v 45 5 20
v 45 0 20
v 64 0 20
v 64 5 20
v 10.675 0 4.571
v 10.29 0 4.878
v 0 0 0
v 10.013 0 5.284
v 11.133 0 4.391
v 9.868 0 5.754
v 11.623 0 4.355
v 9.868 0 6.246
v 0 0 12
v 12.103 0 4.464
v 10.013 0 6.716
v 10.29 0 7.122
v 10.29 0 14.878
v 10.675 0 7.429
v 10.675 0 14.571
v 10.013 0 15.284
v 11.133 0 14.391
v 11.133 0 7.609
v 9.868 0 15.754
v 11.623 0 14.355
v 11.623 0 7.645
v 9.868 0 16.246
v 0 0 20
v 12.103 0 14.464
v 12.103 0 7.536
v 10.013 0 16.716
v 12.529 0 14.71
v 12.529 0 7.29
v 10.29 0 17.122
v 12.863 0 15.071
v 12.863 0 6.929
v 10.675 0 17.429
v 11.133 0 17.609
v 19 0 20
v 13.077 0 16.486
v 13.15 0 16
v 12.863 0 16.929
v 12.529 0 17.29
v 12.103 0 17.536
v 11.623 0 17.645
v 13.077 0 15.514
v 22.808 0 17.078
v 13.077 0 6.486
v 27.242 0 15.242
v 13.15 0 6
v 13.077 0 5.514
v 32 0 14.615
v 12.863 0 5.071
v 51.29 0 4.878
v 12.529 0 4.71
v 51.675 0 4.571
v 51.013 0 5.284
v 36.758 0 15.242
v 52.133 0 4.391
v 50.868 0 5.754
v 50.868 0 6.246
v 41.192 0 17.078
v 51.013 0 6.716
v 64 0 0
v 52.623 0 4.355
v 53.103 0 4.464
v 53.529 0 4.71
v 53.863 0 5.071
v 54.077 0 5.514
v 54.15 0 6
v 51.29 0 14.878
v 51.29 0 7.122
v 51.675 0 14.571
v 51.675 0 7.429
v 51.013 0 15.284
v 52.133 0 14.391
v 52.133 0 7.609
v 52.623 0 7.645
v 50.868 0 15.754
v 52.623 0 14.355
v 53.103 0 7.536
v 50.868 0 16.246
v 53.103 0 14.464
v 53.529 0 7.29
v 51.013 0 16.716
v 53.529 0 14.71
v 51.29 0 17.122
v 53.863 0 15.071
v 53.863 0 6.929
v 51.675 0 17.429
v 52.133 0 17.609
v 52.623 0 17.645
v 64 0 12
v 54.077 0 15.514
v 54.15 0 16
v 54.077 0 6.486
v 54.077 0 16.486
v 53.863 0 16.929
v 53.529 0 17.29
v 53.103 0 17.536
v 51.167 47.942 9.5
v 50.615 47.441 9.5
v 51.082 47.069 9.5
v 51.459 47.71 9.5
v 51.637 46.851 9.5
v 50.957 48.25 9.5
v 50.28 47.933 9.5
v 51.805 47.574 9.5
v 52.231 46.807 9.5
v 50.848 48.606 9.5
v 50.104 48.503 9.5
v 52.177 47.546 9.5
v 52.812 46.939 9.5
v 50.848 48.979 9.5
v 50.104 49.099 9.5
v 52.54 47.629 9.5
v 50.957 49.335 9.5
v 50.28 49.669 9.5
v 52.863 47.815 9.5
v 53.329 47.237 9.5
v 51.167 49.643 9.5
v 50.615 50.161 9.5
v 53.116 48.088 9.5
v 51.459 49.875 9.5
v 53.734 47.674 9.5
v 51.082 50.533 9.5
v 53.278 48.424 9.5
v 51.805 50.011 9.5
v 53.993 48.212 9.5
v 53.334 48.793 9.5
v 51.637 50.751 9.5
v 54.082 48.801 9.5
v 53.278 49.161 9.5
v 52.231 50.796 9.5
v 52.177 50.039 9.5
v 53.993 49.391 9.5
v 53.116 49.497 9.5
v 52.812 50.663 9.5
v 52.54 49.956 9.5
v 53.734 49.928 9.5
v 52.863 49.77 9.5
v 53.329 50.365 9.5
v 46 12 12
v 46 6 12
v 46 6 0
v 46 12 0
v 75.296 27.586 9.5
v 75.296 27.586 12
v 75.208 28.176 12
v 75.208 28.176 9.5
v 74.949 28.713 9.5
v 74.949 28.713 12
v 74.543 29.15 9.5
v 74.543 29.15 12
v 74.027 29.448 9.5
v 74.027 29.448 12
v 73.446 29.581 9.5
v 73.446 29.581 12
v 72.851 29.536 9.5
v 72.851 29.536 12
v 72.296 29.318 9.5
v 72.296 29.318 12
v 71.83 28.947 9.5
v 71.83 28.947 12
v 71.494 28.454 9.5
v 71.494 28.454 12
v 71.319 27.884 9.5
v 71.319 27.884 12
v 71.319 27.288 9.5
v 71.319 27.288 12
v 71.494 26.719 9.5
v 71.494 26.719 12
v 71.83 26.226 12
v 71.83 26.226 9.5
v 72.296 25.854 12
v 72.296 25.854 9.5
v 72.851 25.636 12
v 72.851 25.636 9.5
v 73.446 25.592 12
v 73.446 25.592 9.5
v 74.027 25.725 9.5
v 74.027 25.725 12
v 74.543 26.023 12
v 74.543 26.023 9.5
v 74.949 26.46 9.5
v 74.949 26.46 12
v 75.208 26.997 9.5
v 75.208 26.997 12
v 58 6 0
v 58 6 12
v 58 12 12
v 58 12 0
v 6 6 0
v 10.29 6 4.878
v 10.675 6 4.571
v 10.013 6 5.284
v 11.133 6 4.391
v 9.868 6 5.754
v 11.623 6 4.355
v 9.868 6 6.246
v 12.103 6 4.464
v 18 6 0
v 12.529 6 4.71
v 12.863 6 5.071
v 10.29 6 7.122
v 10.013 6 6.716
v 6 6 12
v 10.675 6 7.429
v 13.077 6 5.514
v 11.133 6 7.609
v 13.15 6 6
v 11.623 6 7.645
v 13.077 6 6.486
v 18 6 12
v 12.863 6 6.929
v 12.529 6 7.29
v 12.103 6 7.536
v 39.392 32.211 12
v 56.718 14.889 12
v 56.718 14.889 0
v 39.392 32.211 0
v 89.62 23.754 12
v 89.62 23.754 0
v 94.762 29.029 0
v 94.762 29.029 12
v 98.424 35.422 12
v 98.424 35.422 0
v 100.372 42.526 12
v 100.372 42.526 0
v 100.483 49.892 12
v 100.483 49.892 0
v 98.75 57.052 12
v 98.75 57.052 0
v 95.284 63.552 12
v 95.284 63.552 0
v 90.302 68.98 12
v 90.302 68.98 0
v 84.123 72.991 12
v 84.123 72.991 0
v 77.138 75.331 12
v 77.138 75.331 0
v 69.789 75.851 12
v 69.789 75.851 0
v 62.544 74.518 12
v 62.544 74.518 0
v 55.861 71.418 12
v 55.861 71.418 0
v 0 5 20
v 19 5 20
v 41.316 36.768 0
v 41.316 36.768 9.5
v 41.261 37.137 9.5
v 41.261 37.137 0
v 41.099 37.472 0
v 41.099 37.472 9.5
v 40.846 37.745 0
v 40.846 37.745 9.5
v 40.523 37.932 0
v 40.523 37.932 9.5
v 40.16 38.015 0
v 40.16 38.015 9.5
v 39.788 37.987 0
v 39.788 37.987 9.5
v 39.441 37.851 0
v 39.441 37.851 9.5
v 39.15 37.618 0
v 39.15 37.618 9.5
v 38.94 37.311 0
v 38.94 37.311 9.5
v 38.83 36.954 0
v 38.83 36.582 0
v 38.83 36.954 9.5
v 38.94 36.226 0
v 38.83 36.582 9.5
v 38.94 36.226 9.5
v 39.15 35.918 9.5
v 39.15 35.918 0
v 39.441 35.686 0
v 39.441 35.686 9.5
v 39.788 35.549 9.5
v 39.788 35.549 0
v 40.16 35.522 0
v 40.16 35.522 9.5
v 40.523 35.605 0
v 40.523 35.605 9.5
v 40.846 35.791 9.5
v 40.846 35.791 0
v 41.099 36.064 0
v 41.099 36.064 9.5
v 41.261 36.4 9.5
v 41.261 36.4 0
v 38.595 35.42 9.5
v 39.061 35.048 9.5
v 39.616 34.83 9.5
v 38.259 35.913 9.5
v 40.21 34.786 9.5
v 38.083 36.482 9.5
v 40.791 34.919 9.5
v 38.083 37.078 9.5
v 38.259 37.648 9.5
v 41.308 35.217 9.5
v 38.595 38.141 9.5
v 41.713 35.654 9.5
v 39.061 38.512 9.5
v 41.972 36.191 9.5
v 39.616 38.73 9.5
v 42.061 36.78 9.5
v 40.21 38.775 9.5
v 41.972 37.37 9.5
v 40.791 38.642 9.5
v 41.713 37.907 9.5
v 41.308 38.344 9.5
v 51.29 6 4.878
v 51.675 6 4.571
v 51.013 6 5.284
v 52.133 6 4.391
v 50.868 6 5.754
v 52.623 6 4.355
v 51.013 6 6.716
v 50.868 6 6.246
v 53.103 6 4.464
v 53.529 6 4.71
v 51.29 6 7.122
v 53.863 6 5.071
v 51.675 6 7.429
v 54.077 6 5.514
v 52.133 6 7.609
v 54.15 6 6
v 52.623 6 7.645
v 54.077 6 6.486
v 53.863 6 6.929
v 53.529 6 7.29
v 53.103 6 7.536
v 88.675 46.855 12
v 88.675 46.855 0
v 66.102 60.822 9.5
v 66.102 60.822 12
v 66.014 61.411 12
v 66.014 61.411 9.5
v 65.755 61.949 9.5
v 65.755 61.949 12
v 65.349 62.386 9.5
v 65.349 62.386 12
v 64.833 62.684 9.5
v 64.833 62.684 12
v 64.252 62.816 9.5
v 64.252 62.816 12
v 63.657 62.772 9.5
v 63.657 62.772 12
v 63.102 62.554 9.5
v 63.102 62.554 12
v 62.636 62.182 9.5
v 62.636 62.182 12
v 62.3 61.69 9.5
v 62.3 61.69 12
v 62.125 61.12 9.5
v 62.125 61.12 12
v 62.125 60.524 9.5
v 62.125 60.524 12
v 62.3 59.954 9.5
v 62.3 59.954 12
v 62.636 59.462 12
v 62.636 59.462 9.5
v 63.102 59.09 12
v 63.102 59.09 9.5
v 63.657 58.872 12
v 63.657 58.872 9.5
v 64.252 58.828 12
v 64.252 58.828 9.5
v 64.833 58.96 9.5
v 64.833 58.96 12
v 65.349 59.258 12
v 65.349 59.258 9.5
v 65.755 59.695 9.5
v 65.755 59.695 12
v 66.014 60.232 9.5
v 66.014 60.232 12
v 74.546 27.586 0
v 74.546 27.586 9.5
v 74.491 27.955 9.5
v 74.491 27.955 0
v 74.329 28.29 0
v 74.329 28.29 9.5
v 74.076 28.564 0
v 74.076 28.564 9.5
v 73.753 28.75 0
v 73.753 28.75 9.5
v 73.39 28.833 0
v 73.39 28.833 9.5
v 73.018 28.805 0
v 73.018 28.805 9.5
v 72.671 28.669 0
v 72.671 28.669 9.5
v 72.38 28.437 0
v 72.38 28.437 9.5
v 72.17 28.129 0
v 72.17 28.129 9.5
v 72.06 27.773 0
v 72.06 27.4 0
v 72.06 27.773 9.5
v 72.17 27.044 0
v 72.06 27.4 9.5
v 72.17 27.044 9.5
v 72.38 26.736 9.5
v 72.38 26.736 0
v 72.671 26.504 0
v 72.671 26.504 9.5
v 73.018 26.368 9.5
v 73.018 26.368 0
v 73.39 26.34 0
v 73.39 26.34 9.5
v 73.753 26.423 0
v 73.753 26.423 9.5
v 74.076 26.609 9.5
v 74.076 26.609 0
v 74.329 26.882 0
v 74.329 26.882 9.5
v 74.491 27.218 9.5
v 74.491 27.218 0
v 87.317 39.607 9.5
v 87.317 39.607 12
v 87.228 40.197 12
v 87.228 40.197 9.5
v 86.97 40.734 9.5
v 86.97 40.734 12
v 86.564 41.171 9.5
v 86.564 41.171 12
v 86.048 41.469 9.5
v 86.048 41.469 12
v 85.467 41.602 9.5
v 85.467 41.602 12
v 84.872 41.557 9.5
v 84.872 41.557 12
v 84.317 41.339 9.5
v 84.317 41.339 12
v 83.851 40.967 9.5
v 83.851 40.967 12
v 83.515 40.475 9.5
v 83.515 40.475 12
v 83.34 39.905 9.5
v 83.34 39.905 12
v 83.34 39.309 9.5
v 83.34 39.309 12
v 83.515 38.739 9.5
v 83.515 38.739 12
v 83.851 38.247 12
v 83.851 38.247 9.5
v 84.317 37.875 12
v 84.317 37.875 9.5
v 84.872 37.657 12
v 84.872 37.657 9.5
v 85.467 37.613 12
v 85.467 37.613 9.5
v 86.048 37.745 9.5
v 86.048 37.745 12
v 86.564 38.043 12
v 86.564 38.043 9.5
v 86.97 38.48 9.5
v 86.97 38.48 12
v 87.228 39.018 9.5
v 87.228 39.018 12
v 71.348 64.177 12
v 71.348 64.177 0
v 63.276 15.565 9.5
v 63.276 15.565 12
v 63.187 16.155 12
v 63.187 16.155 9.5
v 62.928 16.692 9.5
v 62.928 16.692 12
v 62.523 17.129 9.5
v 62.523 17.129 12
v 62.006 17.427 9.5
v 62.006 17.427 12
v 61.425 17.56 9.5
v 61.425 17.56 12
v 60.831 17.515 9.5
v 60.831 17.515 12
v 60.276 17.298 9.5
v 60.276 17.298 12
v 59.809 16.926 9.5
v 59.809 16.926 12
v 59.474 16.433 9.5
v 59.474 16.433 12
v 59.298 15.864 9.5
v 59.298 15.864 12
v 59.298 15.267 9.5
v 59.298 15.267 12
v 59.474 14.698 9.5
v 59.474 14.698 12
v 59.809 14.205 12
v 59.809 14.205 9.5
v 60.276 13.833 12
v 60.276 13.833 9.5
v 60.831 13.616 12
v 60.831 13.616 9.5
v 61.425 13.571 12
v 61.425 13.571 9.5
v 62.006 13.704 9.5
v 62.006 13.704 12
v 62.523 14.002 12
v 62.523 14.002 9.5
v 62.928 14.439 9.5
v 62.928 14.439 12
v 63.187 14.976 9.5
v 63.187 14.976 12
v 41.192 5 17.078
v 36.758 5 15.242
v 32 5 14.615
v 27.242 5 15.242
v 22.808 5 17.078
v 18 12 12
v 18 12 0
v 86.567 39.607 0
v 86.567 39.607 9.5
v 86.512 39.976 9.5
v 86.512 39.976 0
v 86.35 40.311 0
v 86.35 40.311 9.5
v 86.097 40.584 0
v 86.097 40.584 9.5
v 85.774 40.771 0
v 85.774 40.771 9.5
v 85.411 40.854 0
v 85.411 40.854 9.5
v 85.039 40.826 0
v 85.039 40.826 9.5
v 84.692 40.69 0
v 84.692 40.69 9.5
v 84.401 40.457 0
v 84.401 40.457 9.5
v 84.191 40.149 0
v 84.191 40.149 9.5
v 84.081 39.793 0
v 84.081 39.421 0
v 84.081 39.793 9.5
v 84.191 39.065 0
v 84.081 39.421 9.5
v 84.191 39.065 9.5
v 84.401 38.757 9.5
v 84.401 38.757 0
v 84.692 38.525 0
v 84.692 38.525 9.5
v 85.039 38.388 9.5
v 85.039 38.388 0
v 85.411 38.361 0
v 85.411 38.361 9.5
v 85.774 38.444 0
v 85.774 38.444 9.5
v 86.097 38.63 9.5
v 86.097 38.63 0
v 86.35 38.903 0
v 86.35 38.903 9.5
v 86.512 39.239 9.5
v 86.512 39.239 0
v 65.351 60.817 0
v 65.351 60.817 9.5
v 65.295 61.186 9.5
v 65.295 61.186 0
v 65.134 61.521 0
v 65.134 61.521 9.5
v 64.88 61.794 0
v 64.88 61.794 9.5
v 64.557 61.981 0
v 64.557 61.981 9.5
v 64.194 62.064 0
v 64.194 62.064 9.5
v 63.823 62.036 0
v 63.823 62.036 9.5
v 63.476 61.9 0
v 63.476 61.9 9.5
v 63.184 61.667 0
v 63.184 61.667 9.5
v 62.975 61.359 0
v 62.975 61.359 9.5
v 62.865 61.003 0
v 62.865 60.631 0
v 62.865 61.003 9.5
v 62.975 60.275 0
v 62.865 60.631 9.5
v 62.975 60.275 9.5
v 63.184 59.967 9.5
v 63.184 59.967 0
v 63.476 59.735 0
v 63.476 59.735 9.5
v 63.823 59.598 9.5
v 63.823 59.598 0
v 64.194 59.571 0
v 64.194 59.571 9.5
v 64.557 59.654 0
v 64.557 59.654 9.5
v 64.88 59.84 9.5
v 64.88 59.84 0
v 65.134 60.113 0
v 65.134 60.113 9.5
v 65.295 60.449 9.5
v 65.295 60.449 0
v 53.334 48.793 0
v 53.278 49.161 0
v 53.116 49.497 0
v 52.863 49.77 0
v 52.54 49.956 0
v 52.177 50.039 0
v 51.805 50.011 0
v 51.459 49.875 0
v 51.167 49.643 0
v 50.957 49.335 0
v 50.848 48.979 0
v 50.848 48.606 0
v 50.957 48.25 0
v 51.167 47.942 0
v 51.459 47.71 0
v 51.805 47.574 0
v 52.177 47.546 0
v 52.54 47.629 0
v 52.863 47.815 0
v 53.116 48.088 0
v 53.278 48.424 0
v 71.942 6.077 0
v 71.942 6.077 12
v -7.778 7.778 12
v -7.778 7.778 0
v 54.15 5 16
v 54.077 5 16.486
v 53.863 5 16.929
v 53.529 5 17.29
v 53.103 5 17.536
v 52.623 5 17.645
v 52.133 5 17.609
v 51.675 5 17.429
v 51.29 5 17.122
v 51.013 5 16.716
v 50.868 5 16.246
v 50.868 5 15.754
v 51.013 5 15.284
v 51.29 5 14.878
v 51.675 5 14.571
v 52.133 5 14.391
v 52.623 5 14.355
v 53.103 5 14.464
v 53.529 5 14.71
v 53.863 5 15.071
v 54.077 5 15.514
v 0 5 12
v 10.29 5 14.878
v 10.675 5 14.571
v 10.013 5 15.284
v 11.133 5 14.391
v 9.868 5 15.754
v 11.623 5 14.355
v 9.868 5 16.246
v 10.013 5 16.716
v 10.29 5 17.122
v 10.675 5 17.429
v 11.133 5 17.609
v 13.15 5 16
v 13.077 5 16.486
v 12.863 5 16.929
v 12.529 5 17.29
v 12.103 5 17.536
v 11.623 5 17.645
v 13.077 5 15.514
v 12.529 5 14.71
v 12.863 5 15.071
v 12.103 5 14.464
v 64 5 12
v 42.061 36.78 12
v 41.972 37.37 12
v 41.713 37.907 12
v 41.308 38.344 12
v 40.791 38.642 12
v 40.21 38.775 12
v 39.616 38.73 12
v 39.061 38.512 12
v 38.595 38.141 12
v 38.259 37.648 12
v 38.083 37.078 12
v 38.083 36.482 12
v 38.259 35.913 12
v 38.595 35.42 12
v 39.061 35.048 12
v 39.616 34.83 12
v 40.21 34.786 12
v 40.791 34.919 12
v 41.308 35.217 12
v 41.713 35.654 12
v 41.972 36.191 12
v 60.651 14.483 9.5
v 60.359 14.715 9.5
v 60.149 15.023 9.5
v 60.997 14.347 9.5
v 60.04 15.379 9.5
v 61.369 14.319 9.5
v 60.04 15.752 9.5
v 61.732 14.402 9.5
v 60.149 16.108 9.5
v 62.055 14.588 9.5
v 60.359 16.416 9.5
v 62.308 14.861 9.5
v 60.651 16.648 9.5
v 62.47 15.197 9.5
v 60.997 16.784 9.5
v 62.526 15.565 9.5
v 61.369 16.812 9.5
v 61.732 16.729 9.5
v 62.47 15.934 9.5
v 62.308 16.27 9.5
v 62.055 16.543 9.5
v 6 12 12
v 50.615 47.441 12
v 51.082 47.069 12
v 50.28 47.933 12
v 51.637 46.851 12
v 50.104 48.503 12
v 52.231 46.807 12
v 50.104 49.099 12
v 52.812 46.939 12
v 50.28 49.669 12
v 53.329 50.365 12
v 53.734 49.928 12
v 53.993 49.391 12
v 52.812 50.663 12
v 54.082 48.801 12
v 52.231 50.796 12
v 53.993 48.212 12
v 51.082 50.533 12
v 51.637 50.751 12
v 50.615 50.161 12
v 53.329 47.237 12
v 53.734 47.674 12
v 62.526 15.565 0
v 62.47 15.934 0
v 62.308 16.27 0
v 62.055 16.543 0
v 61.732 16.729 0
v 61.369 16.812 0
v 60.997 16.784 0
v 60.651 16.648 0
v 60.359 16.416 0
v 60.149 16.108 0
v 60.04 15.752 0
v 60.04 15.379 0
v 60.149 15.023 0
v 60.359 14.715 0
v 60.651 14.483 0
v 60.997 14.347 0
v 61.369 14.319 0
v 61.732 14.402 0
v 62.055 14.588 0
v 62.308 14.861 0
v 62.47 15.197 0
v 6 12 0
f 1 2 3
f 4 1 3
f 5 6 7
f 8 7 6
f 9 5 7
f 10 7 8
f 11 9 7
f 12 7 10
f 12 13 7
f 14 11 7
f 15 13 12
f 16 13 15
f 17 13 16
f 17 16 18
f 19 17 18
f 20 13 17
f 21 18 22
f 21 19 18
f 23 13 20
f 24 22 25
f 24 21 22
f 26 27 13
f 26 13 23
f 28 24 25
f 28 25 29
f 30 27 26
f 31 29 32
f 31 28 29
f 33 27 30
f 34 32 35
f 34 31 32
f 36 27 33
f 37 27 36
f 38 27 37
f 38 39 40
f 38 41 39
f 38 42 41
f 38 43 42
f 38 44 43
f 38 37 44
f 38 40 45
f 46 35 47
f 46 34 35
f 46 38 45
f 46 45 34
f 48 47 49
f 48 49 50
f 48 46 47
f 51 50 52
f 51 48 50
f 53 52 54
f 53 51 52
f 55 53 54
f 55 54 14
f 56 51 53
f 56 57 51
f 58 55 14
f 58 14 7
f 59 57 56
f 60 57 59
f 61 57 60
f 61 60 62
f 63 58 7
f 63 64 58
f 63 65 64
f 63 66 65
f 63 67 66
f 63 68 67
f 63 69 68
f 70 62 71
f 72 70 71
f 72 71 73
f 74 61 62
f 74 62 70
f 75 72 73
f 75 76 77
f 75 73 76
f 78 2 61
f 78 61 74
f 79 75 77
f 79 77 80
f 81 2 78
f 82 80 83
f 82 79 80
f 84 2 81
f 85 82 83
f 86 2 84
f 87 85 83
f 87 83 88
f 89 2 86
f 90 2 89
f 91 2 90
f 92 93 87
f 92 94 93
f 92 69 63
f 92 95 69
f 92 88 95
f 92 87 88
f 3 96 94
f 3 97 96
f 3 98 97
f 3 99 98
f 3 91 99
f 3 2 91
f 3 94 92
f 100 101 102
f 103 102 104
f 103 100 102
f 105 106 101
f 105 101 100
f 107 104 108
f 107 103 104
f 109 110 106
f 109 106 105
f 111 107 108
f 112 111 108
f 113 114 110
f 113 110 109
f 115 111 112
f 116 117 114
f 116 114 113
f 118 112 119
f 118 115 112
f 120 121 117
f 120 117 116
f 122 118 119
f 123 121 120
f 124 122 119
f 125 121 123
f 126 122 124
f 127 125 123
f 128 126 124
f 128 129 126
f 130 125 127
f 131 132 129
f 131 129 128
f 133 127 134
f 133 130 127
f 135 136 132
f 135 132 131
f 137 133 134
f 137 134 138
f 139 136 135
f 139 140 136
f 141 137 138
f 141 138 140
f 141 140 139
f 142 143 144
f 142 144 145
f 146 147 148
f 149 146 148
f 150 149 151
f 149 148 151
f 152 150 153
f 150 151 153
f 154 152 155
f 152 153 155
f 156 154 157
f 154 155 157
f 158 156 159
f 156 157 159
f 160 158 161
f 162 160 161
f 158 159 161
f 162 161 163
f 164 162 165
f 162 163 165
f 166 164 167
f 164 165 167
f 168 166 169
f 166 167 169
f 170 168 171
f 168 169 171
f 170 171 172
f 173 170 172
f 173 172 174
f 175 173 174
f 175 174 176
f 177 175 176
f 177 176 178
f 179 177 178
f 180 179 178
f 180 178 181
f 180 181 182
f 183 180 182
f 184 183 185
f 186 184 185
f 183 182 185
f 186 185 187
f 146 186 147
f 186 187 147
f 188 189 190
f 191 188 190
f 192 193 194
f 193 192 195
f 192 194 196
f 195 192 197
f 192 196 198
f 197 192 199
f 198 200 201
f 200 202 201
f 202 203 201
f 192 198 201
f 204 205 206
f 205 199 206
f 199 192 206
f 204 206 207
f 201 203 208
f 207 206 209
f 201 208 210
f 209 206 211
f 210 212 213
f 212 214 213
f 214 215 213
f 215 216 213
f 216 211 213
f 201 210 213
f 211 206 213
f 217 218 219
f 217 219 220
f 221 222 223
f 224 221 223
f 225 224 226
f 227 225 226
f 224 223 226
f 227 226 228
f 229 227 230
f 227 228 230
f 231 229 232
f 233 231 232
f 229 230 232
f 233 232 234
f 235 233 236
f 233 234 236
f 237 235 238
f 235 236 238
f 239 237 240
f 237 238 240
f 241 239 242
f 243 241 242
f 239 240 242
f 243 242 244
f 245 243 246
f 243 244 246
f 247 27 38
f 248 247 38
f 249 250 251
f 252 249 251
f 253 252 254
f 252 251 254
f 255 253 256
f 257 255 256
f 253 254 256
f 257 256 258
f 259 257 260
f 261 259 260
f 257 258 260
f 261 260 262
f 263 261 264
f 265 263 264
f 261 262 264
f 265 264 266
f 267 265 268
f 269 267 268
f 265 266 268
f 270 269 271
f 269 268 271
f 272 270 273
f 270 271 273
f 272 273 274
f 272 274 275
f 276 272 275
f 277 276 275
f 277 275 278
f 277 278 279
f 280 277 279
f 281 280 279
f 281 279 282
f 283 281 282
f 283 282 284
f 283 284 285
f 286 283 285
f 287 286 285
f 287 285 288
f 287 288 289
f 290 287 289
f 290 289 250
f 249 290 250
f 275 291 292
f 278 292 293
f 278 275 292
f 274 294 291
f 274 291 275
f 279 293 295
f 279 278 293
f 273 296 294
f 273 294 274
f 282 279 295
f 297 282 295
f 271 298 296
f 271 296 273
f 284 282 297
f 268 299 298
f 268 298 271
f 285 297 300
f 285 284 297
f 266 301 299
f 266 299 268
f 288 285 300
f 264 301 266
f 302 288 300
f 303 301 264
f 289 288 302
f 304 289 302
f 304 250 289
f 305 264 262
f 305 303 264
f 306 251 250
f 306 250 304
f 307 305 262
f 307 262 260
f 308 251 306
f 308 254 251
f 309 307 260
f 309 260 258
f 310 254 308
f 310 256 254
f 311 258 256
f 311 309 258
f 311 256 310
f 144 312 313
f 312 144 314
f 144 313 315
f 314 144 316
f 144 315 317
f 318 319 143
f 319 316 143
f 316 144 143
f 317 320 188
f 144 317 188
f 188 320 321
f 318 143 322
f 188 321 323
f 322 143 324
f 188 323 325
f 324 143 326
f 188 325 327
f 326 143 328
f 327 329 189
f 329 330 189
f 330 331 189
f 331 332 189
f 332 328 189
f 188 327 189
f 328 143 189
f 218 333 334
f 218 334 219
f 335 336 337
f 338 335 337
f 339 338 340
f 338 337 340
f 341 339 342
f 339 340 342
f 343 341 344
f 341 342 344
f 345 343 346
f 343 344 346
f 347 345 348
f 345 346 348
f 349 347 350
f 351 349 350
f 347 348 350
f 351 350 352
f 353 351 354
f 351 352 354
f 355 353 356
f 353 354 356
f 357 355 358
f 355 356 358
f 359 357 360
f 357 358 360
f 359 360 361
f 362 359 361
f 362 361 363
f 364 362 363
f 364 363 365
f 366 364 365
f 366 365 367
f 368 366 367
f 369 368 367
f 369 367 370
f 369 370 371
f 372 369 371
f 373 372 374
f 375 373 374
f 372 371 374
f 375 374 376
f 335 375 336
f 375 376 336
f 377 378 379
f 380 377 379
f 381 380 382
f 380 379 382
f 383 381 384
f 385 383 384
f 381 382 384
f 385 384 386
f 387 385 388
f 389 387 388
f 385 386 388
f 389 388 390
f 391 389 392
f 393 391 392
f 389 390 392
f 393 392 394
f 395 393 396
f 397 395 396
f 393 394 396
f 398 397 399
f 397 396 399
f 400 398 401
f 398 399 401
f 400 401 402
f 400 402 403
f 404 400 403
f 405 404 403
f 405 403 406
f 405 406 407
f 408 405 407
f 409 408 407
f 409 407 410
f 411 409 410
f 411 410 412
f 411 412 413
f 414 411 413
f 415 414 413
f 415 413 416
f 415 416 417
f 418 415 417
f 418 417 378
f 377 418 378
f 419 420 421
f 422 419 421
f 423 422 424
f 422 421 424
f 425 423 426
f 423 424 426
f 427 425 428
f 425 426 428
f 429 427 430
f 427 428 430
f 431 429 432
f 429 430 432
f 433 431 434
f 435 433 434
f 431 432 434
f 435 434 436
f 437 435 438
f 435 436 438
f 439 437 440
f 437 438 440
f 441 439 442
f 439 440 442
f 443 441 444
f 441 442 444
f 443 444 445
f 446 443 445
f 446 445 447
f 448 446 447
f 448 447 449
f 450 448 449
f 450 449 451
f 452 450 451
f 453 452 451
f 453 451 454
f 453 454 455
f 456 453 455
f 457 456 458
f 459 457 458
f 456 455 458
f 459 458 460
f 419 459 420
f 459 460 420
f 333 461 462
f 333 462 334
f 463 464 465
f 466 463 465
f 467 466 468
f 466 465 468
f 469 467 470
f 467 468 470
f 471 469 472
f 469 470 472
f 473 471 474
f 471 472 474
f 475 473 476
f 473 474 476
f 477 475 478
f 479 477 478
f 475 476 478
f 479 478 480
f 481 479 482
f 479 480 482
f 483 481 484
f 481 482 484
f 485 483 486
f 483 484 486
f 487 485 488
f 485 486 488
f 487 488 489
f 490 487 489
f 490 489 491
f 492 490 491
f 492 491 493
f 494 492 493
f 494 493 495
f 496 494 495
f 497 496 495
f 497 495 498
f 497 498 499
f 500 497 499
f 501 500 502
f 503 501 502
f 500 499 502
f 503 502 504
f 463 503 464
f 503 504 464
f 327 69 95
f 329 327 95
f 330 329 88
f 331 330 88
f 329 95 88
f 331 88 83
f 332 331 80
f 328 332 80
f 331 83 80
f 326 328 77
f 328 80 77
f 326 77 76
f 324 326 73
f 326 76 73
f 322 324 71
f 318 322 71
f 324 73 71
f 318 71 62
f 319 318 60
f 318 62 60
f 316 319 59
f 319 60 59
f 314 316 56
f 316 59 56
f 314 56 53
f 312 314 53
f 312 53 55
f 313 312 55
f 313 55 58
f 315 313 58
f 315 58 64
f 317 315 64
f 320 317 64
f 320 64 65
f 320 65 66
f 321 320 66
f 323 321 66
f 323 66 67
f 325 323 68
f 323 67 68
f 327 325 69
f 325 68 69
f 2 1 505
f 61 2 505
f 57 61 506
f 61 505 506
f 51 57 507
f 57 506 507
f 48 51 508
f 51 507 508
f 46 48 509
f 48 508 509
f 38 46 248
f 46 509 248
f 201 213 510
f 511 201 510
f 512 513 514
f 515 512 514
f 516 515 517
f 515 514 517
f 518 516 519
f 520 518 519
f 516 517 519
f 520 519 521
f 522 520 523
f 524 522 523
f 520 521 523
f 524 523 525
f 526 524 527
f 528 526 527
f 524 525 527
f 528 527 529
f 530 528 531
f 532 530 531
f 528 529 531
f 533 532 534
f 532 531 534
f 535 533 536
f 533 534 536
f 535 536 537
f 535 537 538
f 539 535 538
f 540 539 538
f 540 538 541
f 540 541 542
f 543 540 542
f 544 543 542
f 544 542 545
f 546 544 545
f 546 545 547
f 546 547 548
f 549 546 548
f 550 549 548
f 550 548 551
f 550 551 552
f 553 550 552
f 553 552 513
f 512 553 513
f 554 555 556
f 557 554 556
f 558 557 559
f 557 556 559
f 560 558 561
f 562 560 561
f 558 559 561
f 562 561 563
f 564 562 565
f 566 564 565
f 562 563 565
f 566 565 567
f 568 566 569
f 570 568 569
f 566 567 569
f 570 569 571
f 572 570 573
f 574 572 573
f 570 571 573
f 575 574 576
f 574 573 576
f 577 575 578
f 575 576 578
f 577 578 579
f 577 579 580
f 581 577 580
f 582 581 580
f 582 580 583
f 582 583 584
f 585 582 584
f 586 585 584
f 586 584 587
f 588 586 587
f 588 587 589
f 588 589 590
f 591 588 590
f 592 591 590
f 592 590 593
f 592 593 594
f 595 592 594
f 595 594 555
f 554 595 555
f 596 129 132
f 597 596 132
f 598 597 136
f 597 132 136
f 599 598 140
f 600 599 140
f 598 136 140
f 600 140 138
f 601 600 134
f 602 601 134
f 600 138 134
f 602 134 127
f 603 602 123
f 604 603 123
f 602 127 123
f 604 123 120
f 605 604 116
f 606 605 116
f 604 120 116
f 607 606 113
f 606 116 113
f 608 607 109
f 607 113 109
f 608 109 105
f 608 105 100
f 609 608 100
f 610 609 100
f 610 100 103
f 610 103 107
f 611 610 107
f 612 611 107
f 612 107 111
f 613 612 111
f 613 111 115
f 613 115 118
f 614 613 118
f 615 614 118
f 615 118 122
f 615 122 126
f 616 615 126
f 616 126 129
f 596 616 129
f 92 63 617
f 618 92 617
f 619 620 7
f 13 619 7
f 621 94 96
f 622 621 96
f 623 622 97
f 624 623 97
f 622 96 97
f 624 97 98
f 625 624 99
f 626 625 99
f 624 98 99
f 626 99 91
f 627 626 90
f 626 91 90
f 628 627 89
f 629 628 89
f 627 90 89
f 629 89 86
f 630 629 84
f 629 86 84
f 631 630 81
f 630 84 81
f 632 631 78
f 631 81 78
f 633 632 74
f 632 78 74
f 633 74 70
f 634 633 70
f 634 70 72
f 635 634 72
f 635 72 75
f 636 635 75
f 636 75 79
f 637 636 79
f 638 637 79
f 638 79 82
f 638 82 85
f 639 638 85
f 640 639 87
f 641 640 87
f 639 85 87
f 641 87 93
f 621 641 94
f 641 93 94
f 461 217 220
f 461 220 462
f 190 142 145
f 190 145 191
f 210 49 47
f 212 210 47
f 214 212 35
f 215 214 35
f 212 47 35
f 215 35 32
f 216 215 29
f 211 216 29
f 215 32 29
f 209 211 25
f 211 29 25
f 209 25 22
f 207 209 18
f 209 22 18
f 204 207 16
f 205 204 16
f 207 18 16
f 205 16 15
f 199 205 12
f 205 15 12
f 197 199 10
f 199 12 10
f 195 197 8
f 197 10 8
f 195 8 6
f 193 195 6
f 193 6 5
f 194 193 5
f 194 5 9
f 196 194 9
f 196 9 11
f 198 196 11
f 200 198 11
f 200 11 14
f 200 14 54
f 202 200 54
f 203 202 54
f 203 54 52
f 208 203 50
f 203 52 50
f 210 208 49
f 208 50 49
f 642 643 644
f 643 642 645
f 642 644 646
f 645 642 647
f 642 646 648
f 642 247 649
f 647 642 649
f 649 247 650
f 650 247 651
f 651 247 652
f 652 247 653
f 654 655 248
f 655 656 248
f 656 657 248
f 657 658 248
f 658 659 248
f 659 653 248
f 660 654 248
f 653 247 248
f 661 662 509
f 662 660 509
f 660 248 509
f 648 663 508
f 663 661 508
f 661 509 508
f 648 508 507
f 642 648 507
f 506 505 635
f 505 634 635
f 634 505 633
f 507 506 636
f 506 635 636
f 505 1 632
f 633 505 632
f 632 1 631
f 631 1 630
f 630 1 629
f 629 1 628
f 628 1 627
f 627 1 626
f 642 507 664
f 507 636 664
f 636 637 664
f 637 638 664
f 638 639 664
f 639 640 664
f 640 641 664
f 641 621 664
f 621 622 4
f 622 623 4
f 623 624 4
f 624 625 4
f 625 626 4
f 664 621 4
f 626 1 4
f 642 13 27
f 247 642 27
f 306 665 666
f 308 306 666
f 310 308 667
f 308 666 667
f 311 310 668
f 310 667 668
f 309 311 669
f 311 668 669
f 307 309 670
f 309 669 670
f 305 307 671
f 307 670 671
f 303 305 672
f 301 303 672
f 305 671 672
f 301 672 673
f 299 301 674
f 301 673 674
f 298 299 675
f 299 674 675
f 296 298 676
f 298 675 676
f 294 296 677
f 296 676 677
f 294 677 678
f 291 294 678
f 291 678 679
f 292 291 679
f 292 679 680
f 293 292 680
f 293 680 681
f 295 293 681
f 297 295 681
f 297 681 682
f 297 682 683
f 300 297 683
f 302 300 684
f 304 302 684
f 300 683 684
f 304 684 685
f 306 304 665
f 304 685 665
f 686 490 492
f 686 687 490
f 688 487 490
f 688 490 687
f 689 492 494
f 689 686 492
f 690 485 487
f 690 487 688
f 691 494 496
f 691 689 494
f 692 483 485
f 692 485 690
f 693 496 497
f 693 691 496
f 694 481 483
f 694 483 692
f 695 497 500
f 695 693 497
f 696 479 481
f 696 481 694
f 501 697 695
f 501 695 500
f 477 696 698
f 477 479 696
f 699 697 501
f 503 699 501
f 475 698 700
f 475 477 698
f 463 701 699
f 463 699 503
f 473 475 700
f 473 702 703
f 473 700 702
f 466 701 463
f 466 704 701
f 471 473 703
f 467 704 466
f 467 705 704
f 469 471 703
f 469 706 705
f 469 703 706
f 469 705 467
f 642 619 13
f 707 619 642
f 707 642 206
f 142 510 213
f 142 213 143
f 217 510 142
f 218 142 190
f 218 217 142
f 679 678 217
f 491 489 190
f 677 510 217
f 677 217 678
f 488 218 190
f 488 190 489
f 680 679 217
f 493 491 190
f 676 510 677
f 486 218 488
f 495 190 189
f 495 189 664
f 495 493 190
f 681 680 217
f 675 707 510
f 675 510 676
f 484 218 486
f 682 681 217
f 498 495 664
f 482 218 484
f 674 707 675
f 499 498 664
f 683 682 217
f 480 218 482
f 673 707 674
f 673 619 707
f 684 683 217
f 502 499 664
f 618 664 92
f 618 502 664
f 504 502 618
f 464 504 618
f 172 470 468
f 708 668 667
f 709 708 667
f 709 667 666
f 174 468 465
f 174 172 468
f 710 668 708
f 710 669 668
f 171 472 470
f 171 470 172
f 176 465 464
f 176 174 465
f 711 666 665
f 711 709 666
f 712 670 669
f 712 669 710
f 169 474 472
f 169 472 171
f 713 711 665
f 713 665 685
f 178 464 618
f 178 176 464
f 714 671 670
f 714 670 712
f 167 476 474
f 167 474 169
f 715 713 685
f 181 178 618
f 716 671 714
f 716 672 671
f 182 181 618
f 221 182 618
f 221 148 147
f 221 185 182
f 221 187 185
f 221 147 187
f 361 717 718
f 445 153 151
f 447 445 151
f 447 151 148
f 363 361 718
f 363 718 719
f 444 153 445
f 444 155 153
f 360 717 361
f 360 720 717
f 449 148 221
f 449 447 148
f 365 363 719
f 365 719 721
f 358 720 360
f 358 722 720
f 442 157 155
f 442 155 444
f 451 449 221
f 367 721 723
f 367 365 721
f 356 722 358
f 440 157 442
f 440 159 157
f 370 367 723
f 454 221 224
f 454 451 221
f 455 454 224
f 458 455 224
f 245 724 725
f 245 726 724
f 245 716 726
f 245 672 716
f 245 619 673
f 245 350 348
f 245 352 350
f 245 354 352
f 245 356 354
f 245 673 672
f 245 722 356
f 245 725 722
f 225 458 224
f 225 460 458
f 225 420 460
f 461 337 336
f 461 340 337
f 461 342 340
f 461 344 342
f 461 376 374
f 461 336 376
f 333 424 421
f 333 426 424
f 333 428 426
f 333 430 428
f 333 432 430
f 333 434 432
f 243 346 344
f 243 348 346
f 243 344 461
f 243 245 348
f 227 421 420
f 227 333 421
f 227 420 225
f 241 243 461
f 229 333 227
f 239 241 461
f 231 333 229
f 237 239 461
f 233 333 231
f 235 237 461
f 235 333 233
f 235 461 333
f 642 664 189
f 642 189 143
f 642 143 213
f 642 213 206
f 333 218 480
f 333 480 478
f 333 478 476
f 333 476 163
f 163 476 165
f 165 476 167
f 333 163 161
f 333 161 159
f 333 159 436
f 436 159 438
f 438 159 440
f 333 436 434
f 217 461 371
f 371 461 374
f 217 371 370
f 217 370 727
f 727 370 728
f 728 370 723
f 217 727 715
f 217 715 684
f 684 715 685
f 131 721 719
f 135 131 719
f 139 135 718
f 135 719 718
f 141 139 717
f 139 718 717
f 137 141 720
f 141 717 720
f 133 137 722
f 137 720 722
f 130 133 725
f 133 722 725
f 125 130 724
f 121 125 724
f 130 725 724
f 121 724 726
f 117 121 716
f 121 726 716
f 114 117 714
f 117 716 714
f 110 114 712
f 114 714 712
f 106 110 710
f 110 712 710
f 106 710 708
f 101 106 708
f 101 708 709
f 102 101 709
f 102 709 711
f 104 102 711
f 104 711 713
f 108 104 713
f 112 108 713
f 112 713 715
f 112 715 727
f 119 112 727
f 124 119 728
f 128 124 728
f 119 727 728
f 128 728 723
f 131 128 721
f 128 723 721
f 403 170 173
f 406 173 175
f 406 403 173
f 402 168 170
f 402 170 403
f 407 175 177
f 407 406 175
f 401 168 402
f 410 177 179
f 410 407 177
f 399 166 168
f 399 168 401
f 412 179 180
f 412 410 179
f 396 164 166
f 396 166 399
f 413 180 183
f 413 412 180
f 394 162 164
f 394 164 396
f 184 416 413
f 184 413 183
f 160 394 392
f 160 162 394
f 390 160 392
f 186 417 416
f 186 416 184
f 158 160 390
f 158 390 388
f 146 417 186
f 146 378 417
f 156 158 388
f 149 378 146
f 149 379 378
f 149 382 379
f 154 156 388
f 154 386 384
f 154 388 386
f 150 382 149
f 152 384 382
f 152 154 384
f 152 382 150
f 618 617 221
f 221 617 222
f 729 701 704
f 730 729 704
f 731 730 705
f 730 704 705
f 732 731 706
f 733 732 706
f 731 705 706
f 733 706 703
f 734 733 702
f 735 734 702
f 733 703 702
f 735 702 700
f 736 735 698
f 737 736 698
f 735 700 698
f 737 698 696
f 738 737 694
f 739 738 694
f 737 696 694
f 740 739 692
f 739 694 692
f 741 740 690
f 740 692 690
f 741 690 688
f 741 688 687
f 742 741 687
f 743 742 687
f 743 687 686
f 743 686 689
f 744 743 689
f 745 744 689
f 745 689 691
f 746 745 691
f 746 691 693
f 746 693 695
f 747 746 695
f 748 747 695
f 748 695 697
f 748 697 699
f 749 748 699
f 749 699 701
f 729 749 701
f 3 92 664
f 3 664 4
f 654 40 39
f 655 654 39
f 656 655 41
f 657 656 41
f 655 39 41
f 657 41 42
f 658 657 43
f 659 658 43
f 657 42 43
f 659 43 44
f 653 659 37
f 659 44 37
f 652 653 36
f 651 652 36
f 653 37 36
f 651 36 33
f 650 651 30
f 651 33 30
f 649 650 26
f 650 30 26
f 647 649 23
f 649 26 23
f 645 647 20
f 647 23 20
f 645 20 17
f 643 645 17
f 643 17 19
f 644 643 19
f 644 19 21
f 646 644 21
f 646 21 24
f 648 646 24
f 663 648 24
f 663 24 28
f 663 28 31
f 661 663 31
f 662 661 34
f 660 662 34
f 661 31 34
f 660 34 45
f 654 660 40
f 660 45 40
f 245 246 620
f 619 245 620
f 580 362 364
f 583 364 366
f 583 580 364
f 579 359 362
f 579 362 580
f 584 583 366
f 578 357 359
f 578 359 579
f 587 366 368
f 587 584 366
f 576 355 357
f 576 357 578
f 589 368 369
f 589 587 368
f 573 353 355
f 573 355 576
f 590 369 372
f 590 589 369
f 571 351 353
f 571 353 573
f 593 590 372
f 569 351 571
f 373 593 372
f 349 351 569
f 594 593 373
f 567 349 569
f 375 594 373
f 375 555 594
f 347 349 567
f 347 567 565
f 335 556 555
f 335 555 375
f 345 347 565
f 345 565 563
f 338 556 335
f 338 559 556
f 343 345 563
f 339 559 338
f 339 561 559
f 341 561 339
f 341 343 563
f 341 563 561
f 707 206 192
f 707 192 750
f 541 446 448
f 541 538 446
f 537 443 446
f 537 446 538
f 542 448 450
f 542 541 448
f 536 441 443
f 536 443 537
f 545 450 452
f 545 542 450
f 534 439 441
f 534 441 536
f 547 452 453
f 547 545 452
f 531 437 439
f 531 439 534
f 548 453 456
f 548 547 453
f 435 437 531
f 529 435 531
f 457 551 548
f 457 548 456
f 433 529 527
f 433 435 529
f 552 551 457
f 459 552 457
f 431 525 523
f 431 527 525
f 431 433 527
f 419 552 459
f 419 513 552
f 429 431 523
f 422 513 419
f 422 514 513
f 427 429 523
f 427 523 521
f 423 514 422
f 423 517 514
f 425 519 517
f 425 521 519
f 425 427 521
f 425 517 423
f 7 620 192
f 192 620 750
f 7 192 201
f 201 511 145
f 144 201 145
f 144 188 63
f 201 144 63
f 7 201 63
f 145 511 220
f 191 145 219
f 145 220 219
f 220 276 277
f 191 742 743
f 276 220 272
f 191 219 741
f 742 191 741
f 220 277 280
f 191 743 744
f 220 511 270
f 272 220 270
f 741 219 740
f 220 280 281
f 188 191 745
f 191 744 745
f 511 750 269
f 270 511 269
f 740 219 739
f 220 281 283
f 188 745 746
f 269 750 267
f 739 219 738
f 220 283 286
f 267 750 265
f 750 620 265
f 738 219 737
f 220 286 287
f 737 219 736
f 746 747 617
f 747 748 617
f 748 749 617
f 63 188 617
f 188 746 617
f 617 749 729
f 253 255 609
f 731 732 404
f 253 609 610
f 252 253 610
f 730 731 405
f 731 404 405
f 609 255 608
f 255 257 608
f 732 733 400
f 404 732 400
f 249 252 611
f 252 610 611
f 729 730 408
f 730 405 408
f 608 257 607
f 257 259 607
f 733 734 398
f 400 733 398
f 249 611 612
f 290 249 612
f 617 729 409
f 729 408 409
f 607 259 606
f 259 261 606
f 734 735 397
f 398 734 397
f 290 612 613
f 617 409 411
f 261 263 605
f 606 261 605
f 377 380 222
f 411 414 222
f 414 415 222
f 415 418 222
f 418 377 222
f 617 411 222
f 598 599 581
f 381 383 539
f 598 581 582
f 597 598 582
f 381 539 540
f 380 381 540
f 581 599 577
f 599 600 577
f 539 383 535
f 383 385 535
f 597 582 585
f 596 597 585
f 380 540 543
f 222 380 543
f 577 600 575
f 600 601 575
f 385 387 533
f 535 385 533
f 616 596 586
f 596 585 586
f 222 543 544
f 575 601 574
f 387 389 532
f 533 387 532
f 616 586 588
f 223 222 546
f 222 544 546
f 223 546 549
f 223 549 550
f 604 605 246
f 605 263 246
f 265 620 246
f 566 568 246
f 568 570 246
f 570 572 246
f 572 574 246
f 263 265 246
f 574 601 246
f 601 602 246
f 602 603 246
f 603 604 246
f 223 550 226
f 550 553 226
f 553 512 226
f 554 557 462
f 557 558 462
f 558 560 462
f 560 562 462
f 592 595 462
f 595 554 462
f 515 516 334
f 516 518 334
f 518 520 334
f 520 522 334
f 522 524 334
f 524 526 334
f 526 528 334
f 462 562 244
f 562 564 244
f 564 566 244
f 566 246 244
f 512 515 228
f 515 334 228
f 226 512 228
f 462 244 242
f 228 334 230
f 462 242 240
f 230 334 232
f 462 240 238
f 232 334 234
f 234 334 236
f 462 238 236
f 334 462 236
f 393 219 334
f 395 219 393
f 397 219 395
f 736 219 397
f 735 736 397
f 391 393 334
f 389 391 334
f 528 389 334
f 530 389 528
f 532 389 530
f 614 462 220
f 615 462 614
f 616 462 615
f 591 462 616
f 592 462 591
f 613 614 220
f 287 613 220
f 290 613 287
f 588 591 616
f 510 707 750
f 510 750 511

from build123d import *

# Parameters (mm, degrees)
BOSS_EXTRUDE2_DEPTH     = 12
CUT_EXTRUDE1_DEPTH      = 13
SKETCH3_R               = 1.25
CUT_EXTRUDE2_DEPTH      = 13
SKETCH5_R               = 1.65
CUT_EXTRUDE3_DEPTH      = 6
SKETCH6_W               = 12
SKETCH6_H               = 6
CUT_EXTRUDE4_DEPTH      = 13
SKETCH8_W               = 64
SKETCH8_H               = 8
BOSS_EXTRUDE3_DEPTH     = 5
SKETCH9_R               = 1.65
CUT_EXTRUDE5_DEPTH      = 5
SKETCH10_R              = 2
CUT_EXTRUDE6_DEPTH      = 2.5
CUT_EXTRUDE7_DEPTH      = 71.896039473
CUT_EXTRUDE7_DEPTH_BACK = 10


with BuildPart() as part:
    # Sketch1 → Boss-Extrude2 (new body)
    with BuildSketch(Plane.XY):
        with BuildLine():
            Line((0, 0), (64, 0))
            Line((64, 0), (71.941945847, 6.076635266))
            Line((71.941945847, 6.076635266), (89.619615377, 23.754304796))
            ThreePointArc((89.619615377, 23.754304796), (95.283552654, 63.552389681), (55.861435714, 71.4177849))
            Line((55.861435714, 71.4177849), (-7.778174593, 7.778174593))
            Line((-7.778174593, 7.778174593), (0, 0))
        make_face()
    extrude(amount=BOSS_EXTRUDE2_DEPTH)

    # Sketch2 → Cut-Extrude1 (cut, through all)
    with BuildSketch(Plane.XY.offset(12)):
        Polygon((56.718479601, 14.889386235), (39.391727984, 32.210866495), (71.348091567, 64.176955192), (88.674843183, 46.855474932), align=None)
    extrude(amount=-CUT_EXTRUDE1_DEPTH, mode=Mode.SUBTRACT)

    # Sketch3 → Cut-Extrude2 (cut, through all)
    with BuildSketch(Plane.XY.offset(12)):
        with Locations((85.317188693, 39.60711951)):
            Circle(SKETCH3_R)
        with Locations((73.296373413, 27.58630423)):
            Circle(SKETCH3_R)
        with Locations((61.275558133, 15.565488949)):
            Circle(SKETCH3_R)
        with Locations((64.100758142, 60.817095339)):
            Circle(SKETCH3_R)
        with Locations((52.083601094, 48.792622939)):
            Circle(SKETCH3_R)
        with Locations((40.066444047, 36.76815054)):
            Circle(SKETCH3_R)
    extrude(amount=-CUT_EXTRUDE2_DEPTH, mode=Mode.SUBTRACT)

    # Sketch5 → Cut-Extrude3 (cut)
    with BuildSketch(Plane.XZ):
        with Locations((11.5, 6)):
            Circle(SKETCH5_R)
        with Locations((52.5, 6)):
            Circle(SKETCH5_R)
    extrude(amount=-CUT_EXTRUDE3_DEPTH, mode=Mode.SUBTRACT)

    # Sketch6 → Cut-Extrude4 (cut, through all)
    with BuildSketch(Plane.XY.offset(12)):
        with Locations((12, 9)):
            Rectangle(SKETCH6_W, SKETCH6_H)
        with Locations((52, 9)):
            Rectangle(SKETCH6_W, SKETCH6_H)
    extrude(amount=-CUT_EXTRUDE4_DEPTH, mode=Mode.SUBTRACT)

    # Sketch8 → Boss-Extrude3 (add)
    with BuildSketch(Plane.XZ):
        with Locations((32, 16)):
            Rectangle(SKETCH8_W, SKETCH8_H)
    extrude(amount=-BOSS_EXTRUDE3_DEPTH)

    # Sketch9 → Cut-Extrude5 (cut)
    with BuildSketch(Plane.XZ):
        with Locations((11.5, 16)):
            Circle(SKETCH9_R)
        with Locations((52.5, 16)):
            Circle(SKETCH9_R)
    extrude(amount=-CUT_EXTRUDE5_DEPTH, mode=Mode.SUBTRACT)

    # Sketch10 → Cut-Extrude6 (cut)
    with BuildSketch(Plane.XY.offset(12)):
        with Locations((85.317188693, 39.60711951)):
            Circle(SKETCH10_R)
        with Locations((73.296373413, 27.58630423)):
            Circle(SKETCH10_R)
        with Locations((61.275558133, 15.565488949)):
            Circle(SKETCH10_R)
        with Locations((40.060741262, 36.78030582)):
            Circle(SKETCH10_R)
        with Locations((52.081556543, 48.8011211)):
            Circle(SKETCH10_R)
        with Locations((64.102371823, 60.82193638)):
            Circle(SKETCH10_R)
    extrude(amount=-CUT_EXTRUDE6_DEPTH, mode=Mode.SUBTRACT)

    # Sketch11 → Cut-Extrude7 (cut, two sides)
    with BuildSketch(Plane(origin=(0, 5, 0), x_dir=(1, 0, 0), z_dir=(0, 1, 0))) as cut_extrude7_sk:
        with BuildLine():
            ThreePointArc((45, -20), (32, -14.615223689), (19, -20))
            Line((19, -20), (45, -20))
        make_face()
    extrude(amount=CUT_EXTRUDE7_DEPTH, mode=Mode.SUBTRACT)
    extrude(cut_extrude7_sk.sketch, amount=-CUT_EXTRUDE7_DEPTH_BACK, mode=Mode.SUBTRACT)


solid = part.part
